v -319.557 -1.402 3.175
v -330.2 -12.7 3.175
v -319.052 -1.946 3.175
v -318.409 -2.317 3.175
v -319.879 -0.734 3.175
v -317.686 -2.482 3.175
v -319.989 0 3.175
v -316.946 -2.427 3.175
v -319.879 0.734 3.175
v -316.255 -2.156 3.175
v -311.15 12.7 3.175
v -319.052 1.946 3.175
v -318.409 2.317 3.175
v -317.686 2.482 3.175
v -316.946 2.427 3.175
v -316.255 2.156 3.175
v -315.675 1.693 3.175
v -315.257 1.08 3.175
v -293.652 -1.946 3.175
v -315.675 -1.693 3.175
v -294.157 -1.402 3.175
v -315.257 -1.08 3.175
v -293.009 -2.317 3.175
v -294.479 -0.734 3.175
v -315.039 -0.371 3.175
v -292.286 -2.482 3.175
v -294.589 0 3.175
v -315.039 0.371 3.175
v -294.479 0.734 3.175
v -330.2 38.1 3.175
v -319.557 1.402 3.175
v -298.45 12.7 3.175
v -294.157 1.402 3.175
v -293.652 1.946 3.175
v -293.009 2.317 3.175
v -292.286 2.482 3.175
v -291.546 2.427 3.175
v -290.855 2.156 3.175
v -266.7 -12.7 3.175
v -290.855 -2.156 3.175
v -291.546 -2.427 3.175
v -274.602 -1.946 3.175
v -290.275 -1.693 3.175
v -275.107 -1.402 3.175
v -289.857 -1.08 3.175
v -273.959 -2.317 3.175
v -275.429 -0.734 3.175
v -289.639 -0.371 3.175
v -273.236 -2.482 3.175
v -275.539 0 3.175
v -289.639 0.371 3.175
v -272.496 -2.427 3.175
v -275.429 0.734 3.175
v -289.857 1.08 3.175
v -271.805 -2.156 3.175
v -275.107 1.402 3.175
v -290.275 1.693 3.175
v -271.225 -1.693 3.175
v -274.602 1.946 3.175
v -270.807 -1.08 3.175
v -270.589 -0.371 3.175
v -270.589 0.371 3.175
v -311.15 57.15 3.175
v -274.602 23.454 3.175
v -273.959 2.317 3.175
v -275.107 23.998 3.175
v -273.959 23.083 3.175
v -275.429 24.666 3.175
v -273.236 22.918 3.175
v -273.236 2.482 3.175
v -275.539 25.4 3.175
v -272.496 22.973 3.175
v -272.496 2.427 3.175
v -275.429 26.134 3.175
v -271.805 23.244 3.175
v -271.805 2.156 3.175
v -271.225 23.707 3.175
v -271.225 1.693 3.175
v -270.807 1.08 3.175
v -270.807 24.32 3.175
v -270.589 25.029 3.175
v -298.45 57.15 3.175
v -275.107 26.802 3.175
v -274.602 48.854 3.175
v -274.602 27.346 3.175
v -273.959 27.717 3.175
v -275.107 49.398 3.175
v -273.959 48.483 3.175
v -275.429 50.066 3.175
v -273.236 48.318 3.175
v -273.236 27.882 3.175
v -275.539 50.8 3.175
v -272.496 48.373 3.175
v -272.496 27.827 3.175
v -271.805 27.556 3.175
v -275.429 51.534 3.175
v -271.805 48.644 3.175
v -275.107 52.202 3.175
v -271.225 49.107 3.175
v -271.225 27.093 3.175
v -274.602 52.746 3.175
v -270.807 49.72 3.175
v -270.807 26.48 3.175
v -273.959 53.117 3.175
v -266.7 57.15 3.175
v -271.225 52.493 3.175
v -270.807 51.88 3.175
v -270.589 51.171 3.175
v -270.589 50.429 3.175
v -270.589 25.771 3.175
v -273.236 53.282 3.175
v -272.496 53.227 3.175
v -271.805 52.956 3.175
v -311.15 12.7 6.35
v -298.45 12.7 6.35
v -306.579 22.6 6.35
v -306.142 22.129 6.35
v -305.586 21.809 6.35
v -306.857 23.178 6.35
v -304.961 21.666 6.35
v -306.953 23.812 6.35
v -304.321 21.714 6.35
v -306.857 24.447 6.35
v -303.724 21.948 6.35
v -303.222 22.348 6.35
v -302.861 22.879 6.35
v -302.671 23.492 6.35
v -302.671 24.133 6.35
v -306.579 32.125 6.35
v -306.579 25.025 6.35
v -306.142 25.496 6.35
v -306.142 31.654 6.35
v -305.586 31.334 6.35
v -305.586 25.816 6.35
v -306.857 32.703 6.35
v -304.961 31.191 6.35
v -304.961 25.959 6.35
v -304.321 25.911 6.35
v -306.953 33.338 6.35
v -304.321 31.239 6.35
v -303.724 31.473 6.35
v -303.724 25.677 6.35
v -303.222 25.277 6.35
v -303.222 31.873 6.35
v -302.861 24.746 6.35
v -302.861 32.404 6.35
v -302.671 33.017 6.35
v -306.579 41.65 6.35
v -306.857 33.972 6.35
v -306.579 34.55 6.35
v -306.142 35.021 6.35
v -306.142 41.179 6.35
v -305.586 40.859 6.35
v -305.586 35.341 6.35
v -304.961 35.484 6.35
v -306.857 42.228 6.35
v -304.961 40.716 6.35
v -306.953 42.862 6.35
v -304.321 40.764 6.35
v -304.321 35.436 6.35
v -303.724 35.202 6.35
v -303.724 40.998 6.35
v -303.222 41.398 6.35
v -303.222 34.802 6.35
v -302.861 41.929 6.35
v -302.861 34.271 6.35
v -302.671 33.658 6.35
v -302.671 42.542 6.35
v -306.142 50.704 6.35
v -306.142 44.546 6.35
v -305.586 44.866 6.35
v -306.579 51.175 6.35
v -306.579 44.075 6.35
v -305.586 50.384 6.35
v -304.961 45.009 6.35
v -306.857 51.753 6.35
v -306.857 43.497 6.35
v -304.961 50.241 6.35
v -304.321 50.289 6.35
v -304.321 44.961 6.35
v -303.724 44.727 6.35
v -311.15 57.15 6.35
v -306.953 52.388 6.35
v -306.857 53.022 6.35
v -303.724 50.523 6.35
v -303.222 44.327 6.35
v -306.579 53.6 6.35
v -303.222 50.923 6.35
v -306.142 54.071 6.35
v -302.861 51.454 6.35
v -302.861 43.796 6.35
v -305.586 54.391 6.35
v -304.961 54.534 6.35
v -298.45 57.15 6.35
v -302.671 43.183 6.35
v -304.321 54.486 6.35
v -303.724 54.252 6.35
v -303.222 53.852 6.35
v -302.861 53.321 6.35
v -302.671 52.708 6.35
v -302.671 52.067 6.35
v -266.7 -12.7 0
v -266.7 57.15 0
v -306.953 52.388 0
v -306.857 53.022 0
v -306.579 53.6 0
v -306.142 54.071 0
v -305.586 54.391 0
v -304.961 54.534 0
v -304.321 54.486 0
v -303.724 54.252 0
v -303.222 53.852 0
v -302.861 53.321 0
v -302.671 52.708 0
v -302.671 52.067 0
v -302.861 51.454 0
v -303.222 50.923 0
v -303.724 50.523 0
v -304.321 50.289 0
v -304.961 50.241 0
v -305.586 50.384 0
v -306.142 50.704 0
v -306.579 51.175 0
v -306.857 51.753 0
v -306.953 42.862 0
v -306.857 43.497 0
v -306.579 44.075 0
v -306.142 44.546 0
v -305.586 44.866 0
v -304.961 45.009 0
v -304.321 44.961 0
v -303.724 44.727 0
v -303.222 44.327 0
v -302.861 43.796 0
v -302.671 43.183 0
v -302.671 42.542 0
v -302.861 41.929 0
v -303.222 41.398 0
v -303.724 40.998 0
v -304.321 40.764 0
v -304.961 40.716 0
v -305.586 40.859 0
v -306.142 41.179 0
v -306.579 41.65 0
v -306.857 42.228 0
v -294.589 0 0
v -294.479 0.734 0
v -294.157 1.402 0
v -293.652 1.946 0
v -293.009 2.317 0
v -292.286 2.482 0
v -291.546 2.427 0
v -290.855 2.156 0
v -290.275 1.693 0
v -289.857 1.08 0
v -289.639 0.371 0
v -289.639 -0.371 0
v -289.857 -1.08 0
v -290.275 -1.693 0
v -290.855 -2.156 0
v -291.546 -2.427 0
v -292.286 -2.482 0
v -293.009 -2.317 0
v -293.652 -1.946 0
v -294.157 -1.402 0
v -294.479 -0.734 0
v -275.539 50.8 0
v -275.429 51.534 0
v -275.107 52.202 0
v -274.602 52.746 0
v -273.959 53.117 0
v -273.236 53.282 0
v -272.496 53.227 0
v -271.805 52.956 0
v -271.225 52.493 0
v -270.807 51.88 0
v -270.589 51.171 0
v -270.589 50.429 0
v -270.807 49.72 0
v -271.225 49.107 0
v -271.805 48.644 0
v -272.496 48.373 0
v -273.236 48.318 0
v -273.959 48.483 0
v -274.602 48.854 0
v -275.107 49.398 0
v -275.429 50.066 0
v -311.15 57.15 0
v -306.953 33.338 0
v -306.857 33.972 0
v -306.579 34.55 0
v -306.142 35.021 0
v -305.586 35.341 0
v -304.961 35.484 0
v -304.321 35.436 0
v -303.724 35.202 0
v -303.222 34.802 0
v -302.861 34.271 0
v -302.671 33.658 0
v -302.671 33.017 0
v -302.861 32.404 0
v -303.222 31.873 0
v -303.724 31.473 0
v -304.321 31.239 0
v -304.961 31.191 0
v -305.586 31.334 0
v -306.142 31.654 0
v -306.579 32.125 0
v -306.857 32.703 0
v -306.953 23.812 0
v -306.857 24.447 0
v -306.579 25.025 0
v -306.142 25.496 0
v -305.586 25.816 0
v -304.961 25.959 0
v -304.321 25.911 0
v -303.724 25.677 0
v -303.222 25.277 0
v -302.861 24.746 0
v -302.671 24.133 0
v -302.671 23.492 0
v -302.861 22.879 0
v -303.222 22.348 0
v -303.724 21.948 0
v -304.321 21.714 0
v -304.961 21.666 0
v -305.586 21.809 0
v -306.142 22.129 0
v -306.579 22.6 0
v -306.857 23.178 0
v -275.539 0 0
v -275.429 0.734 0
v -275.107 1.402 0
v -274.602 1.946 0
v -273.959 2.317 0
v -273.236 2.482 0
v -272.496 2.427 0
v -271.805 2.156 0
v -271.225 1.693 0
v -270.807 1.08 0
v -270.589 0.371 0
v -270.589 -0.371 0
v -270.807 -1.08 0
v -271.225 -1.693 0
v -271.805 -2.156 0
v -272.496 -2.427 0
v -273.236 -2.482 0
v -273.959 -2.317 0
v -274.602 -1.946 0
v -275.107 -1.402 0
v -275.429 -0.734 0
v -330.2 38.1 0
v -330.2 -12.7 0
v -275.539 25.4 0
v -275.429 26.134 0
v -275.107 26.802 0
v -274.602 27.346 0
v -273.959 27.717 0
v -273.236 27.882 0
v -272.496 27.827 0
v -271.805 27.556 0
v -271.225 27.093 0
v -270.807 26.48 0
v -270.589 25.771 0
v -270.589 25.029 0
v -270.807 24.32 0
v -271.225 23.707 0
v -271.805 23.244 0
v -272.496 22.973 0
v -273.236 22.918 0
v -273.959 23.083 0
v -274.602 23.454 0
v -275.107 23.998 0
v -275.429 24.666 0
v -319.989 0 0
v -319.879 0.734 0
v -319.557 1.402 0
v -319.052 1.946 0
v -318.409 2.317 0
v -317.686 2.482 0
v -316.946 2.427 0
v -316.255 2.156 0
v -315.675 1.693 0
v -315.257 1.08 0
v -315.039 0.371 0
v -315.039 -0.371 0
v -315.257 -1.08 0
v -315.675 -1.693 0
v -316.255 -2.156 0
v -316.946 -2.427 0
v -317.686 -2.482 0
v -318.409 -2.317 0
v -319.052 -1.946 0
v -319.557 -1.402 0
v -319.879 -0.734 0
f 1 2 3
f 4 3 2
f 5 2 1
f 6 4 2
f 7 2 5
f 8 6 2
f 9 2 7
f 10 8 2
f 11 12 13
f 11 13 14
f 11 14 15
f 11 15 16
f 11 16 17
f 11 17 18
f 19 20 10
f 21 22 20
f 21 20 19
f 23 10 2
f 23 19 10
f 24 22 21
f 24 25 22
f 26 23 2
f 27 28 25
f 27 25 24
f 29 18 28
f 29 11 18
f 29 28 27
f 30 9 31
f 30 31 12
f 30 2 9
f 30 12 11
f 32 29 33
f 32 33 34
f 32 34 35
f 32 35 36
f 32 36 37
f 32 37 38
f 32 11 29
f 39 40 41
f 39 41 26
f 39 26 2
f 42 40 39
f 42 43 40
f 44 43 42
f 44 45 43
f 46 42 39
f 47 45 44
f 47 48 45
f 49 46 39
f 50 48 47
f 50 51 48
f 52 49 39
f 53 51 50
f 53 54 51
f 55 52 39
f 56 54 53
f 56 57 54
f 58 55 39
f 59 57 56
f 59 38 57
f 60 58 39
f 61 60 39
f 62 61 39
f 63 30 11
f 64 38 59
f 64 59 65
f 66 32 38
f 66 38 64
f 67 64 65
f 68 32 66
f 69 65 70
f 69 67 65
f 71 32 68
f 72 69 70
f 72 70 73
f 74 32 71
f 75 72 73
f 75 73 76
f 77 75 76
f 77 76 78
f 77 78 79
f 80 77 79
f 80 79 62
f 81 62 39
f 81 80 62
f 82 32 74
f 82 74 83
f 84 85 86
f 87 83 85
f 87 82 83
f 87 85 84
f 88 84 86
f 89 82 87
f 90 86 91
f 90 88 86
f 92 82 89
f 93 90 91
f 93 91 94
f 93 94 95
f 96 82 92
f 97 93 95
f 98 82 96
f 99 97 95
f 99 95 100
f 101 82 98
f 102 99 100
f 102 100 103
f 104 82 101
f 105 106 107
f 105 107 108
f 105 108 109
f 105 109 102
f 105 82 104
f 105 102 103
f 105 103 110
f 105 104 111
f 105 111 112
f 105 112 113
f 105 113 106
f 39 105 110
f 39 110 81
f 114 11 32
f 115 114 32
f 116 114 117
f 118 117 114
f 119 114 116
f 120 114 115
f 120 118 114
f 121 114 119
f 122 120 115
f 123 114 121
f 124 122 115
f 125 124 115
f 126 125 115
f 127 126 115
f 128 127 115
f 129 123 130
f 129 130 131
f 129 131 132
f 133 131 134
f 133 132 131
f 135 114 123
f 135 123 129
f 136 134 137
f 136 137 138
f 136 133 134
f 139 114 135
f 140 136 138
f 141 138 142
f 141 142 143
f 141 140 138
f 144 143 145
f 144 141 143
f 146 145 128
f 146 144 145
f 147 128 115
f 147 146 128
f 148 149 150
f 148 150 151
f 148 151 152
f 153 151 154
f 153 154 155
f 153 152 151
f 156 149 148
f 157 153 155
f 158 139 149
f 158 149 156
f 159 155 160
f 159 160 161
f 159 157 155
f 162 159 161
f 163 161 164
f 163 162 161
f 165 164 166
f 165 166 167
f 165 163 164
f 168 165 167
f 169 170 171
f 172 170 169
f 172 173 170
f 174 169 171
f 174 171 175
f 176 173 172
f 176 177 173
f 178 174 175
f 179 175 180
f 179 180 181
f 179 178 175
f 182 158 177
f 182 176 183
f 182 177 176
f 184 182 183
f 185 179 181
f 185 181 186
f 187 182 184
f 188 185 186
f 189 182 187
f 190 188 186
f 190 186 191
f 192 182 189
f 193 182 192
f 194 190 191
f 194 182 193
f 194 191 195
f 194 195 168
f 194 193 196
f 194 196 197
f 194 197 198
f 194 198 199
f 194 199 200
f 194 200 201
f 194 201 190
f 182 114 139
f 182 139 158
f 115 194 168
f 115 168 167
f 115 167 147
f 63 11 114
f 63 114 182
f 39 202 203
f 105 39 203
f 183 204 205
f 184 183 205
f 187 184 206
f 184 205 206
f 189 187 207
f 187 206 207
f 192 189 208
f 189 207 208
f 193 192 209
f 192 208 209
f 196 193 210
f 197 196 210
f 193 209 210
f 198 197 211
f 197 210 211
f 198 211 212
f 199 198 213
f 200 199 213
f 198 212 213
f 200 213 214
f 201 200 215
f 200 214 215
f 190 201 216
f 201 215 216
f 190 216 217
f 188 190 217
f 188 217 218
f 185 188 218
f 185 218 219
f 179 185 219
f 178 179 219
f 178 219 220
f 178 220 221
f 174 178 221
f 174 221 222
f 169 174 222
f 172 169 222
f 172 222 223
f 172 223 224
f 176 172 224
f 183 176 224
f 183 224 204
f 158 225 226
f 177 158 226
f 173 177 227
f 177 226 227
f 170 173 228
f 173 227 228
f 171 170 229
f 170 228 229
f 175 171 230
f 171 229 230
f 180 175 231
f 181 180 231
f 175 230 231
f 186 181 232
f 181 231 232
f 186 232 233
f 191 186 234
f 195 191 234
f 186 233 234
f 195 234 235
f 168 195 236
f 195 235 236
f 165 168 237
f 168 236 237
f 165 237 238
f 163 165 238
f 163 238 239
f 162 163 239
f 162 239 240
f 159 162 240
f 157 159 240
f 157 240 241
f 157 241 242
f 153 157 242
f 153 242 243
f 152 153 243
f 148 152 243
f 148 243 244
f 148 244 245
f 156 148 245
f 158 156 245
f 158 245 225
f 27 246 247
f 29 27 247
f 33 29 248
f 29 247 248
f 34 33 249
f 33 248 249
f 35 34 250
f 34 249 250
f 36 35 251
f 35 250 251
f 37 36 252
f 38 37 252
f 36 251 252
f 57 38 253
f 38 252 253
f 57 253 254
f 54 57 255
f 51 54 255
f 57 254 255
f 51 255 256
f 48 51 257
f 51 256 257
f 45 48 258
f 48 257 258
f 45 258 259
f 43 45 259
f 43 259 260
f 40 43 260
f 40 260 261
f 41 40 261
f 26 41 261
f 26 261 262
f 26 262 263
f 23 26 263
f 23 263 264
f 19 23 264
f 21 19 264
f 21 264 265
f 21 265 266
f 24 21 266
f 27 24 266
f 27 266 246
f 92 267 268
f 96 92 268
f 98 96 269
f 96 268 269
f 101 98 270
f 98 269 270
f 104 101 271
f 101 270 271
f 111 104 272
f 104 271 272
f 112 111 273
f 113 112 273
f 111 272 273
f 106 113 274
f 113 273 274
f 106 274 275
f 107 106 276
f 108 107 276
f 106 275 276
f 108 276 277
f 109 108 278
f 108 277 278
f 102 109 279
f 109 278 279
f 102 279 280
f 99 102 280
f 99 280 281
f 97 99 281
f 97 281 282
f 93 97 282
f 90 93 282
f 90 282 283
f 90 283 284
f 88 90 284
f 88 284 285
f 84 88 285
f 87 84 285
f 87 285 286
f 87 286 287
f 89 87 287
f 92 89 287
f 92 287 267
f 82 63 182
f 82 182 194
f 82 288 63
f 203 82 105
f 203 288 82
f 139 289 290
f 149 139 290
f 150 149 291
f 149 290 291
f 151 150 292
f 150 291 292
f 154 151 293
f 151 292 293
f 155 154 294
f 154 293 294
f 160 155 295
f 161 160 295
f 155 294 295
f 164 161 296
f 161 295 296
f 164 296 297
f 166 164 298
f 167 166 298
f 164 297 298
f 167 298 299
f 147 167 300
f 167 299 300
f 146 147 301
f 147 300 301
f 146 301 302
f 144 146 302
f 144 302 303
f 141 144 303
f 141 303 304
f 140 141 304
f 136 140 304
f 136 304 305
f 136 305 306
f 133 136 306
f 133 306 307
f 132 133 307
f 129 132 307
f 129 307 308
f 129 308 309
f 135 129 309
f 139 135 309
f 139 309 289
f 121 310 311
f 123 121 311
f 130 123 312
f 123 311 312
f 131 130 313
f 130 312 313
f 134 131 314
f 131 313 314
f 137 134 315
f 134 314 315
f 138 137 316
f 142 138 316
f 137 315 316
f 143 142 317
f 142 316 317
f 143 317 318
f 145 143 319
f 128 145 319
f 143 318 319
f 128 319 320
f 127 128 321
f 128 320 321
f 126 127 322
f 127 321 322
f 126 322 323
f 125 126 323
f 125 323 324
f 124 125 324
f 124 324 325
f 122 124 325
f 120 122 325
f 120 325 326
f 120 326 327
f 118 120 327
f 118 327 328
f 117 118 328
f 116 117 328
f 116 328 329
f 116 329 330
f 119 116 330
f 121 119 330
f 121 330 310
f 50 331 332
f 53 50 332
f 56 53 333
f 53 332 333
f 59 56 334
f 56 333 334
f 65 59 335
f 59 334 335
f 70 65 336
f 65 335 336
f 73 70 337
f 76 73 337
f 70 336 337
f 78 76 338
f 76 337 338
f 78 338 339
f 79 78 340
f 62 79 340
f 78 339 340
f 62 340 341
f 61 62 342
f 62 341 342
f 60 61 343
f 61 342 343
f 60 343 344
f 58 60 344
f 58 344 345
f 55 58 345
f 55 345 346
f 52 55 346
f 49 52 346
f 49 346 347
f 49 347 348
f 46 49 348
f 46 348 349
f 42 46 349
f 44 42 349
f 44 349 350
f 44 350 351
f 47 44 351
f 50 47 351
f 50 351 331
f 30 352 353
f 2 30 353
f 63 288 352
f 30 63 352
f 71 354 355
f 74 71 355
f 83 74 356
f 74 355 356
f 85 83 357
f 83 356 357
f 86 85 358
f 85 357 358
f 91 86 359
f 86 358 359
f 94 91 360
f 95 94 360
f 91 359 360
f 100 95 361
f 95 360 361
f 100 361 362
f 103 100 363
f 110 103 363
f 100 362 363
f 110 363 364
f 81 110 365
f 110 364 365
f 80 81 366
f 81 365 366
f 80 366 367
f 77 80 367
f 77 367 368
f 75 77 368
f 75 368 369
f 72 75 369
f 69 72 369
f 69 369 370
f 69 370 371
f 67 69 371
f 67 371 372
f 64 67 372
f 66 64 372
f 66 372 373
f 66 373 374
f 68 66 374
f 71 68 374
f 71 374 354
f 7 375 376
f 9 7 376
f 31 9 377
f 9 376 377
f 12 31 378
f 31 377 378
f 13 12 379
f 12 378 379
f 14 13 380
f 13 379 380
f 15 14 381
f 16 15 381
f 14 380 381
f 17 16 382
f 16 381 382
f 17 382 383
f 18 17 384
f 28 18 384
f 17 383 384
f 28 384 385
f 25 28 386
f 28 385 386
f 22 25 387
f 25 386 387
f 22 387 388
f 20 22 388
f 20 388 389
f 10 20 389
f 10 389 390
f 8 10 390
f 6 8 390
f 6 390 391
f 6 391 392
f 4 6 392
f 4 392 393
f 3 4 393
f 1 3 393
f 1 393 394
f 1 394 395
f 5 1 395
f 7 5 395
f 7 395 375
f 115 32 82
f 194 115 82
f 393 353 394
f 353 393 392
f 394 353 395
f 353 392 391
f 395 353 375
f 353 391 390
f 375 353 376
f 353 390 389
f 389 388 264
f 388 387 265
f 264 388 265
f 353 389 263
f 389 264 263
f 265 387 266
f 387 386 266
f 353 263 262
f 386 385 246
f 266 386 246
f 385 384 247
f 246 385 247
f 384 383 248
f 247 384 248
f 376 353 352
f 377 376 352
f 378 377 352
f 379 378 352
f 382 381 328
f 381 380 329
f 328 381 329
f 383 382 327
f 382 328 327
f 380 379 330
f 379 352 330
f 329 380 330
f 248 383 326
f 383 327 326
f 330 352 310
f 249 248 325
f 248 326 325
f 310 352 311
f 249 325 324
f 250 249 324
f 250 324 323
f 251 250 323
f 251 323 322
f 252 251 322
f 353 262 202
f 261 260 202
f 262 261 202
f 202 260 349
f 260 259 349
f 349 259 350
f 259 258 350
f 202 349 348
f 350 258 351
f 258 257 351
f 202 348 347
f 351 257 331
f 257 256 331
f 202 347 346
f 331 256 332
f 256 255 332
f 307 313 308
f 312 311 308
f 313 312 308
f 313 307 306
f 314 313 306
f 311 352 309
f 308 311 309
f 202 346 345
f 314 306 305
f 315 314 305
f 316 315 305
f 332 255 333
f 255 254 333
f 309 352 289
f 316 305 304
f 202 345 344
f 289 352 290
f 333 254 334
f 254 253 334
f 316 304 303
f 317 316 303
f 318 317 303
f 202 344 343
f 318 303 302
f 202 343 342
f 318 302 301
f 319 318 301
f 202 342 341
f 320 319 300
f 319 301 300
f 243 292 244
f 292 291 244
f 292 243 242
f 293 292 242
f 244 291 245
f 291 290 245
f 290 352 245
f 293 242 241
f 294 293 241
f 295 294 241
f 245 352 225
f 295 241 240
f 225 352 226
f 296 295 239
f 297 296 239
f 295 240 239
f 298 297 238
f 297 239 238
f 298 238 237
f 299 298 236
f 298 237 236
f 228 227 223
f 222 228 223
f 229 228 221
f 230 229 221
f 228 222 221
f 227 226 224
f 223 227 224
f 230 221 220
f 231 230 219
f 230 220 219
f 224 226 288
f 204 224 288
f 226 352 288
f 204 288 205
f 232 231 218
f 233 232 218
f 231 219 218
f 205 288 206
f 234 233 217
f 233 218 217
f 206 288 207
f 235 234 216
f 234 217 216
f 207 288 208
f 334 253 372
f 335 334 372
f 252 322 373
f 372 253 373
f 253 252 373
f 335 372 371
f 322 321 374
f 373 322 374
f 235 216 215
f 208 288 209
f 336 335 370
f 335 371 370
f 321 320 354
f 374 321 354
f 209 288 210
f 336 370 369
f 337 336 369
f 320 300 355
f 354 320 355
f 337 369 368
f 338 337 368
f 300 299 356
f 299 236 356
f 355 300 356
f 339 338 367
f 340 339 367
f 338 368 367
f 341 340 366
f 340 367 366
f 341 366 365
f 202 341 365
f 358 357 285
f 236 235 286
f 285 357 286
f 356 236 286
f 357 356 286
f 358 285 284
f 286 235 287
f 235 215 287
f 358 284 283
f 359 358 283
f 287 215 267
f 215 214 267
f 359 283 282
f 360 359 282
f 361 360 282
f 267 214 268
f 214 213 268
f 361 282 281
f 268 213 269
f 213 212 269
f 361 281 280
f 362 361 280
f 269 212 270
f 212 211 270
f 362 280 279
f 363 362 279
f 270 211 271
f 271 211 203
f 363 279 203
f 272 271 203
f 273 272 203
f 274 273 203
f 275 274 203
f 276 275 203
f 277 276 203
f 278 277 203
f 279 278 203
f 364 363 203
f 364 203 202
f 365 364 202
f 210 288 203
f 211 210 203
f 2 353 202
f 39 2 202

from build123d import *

# Parameters (mm, degrees)
BOSS_EXTRUDE1_DEPTH    = 3.175
F_10_CLEARANCE_HOLE1_D = 4.9784
SKETCH5_W              = 12.7
SKETCH5_H              = 44.45
BOSS_EXTRUDE2_DEPTH    = 3.175
F_8_CLEARANCE_HOLE1_D  = 4.3053


with BuildPart() as part:
    # Sketch1 → Boss-Extrude1 (new body)
    with BuildSketch(Plane.XY):
        Polygon((-266.700000508, -12.7), (-266.700000508, 57.15), (-279.400000508, 57.15), (-311.150000508, 57.15), (-330.200000508, 38.1), (-330.200000508, 12.7), (-330.200000508, -12.7), (-279.400000508, -12.7), align=None)
    extrude(amount=BOSS_EXTRUDE1_DEPTH)

    # #10 Clearance Hole1 (through all)
    with Locations(Plane.XY.offset(3.175)):
        with Locations((-273.050000508, 50.8), (-273.050000508, 25.4), (-273.050000508, 0), (-317.500000508, 0), (-292.100000508, 0)):
            Hole(F_10_CLEARANCE_HOLE1_D / 2)

    # Sketch5 → Boss-Extrude2 (add)
    with BuildSketch(Plane.XY.offset(3.175)):
        with Locations((-304.800000508, 34.925)):
            Rectangle(SKETCH5_W, SKETCH5_H)
    extrude(amount=BOSS_EXTRUDE2_DEPTH)

    # #8 Clearance Hole1 (through all)
    with Locations(Plane.XY.offset(6.35)):
        with Locations((-304.800000508, 42.8625), (-304.800000508, 52.3875), (-304.800000508, 33.3375), (-304.800000508, 23.8125)):
            Hole(F_8_CLEARANCE_HOLE1_D / 2)


solid = part.part
